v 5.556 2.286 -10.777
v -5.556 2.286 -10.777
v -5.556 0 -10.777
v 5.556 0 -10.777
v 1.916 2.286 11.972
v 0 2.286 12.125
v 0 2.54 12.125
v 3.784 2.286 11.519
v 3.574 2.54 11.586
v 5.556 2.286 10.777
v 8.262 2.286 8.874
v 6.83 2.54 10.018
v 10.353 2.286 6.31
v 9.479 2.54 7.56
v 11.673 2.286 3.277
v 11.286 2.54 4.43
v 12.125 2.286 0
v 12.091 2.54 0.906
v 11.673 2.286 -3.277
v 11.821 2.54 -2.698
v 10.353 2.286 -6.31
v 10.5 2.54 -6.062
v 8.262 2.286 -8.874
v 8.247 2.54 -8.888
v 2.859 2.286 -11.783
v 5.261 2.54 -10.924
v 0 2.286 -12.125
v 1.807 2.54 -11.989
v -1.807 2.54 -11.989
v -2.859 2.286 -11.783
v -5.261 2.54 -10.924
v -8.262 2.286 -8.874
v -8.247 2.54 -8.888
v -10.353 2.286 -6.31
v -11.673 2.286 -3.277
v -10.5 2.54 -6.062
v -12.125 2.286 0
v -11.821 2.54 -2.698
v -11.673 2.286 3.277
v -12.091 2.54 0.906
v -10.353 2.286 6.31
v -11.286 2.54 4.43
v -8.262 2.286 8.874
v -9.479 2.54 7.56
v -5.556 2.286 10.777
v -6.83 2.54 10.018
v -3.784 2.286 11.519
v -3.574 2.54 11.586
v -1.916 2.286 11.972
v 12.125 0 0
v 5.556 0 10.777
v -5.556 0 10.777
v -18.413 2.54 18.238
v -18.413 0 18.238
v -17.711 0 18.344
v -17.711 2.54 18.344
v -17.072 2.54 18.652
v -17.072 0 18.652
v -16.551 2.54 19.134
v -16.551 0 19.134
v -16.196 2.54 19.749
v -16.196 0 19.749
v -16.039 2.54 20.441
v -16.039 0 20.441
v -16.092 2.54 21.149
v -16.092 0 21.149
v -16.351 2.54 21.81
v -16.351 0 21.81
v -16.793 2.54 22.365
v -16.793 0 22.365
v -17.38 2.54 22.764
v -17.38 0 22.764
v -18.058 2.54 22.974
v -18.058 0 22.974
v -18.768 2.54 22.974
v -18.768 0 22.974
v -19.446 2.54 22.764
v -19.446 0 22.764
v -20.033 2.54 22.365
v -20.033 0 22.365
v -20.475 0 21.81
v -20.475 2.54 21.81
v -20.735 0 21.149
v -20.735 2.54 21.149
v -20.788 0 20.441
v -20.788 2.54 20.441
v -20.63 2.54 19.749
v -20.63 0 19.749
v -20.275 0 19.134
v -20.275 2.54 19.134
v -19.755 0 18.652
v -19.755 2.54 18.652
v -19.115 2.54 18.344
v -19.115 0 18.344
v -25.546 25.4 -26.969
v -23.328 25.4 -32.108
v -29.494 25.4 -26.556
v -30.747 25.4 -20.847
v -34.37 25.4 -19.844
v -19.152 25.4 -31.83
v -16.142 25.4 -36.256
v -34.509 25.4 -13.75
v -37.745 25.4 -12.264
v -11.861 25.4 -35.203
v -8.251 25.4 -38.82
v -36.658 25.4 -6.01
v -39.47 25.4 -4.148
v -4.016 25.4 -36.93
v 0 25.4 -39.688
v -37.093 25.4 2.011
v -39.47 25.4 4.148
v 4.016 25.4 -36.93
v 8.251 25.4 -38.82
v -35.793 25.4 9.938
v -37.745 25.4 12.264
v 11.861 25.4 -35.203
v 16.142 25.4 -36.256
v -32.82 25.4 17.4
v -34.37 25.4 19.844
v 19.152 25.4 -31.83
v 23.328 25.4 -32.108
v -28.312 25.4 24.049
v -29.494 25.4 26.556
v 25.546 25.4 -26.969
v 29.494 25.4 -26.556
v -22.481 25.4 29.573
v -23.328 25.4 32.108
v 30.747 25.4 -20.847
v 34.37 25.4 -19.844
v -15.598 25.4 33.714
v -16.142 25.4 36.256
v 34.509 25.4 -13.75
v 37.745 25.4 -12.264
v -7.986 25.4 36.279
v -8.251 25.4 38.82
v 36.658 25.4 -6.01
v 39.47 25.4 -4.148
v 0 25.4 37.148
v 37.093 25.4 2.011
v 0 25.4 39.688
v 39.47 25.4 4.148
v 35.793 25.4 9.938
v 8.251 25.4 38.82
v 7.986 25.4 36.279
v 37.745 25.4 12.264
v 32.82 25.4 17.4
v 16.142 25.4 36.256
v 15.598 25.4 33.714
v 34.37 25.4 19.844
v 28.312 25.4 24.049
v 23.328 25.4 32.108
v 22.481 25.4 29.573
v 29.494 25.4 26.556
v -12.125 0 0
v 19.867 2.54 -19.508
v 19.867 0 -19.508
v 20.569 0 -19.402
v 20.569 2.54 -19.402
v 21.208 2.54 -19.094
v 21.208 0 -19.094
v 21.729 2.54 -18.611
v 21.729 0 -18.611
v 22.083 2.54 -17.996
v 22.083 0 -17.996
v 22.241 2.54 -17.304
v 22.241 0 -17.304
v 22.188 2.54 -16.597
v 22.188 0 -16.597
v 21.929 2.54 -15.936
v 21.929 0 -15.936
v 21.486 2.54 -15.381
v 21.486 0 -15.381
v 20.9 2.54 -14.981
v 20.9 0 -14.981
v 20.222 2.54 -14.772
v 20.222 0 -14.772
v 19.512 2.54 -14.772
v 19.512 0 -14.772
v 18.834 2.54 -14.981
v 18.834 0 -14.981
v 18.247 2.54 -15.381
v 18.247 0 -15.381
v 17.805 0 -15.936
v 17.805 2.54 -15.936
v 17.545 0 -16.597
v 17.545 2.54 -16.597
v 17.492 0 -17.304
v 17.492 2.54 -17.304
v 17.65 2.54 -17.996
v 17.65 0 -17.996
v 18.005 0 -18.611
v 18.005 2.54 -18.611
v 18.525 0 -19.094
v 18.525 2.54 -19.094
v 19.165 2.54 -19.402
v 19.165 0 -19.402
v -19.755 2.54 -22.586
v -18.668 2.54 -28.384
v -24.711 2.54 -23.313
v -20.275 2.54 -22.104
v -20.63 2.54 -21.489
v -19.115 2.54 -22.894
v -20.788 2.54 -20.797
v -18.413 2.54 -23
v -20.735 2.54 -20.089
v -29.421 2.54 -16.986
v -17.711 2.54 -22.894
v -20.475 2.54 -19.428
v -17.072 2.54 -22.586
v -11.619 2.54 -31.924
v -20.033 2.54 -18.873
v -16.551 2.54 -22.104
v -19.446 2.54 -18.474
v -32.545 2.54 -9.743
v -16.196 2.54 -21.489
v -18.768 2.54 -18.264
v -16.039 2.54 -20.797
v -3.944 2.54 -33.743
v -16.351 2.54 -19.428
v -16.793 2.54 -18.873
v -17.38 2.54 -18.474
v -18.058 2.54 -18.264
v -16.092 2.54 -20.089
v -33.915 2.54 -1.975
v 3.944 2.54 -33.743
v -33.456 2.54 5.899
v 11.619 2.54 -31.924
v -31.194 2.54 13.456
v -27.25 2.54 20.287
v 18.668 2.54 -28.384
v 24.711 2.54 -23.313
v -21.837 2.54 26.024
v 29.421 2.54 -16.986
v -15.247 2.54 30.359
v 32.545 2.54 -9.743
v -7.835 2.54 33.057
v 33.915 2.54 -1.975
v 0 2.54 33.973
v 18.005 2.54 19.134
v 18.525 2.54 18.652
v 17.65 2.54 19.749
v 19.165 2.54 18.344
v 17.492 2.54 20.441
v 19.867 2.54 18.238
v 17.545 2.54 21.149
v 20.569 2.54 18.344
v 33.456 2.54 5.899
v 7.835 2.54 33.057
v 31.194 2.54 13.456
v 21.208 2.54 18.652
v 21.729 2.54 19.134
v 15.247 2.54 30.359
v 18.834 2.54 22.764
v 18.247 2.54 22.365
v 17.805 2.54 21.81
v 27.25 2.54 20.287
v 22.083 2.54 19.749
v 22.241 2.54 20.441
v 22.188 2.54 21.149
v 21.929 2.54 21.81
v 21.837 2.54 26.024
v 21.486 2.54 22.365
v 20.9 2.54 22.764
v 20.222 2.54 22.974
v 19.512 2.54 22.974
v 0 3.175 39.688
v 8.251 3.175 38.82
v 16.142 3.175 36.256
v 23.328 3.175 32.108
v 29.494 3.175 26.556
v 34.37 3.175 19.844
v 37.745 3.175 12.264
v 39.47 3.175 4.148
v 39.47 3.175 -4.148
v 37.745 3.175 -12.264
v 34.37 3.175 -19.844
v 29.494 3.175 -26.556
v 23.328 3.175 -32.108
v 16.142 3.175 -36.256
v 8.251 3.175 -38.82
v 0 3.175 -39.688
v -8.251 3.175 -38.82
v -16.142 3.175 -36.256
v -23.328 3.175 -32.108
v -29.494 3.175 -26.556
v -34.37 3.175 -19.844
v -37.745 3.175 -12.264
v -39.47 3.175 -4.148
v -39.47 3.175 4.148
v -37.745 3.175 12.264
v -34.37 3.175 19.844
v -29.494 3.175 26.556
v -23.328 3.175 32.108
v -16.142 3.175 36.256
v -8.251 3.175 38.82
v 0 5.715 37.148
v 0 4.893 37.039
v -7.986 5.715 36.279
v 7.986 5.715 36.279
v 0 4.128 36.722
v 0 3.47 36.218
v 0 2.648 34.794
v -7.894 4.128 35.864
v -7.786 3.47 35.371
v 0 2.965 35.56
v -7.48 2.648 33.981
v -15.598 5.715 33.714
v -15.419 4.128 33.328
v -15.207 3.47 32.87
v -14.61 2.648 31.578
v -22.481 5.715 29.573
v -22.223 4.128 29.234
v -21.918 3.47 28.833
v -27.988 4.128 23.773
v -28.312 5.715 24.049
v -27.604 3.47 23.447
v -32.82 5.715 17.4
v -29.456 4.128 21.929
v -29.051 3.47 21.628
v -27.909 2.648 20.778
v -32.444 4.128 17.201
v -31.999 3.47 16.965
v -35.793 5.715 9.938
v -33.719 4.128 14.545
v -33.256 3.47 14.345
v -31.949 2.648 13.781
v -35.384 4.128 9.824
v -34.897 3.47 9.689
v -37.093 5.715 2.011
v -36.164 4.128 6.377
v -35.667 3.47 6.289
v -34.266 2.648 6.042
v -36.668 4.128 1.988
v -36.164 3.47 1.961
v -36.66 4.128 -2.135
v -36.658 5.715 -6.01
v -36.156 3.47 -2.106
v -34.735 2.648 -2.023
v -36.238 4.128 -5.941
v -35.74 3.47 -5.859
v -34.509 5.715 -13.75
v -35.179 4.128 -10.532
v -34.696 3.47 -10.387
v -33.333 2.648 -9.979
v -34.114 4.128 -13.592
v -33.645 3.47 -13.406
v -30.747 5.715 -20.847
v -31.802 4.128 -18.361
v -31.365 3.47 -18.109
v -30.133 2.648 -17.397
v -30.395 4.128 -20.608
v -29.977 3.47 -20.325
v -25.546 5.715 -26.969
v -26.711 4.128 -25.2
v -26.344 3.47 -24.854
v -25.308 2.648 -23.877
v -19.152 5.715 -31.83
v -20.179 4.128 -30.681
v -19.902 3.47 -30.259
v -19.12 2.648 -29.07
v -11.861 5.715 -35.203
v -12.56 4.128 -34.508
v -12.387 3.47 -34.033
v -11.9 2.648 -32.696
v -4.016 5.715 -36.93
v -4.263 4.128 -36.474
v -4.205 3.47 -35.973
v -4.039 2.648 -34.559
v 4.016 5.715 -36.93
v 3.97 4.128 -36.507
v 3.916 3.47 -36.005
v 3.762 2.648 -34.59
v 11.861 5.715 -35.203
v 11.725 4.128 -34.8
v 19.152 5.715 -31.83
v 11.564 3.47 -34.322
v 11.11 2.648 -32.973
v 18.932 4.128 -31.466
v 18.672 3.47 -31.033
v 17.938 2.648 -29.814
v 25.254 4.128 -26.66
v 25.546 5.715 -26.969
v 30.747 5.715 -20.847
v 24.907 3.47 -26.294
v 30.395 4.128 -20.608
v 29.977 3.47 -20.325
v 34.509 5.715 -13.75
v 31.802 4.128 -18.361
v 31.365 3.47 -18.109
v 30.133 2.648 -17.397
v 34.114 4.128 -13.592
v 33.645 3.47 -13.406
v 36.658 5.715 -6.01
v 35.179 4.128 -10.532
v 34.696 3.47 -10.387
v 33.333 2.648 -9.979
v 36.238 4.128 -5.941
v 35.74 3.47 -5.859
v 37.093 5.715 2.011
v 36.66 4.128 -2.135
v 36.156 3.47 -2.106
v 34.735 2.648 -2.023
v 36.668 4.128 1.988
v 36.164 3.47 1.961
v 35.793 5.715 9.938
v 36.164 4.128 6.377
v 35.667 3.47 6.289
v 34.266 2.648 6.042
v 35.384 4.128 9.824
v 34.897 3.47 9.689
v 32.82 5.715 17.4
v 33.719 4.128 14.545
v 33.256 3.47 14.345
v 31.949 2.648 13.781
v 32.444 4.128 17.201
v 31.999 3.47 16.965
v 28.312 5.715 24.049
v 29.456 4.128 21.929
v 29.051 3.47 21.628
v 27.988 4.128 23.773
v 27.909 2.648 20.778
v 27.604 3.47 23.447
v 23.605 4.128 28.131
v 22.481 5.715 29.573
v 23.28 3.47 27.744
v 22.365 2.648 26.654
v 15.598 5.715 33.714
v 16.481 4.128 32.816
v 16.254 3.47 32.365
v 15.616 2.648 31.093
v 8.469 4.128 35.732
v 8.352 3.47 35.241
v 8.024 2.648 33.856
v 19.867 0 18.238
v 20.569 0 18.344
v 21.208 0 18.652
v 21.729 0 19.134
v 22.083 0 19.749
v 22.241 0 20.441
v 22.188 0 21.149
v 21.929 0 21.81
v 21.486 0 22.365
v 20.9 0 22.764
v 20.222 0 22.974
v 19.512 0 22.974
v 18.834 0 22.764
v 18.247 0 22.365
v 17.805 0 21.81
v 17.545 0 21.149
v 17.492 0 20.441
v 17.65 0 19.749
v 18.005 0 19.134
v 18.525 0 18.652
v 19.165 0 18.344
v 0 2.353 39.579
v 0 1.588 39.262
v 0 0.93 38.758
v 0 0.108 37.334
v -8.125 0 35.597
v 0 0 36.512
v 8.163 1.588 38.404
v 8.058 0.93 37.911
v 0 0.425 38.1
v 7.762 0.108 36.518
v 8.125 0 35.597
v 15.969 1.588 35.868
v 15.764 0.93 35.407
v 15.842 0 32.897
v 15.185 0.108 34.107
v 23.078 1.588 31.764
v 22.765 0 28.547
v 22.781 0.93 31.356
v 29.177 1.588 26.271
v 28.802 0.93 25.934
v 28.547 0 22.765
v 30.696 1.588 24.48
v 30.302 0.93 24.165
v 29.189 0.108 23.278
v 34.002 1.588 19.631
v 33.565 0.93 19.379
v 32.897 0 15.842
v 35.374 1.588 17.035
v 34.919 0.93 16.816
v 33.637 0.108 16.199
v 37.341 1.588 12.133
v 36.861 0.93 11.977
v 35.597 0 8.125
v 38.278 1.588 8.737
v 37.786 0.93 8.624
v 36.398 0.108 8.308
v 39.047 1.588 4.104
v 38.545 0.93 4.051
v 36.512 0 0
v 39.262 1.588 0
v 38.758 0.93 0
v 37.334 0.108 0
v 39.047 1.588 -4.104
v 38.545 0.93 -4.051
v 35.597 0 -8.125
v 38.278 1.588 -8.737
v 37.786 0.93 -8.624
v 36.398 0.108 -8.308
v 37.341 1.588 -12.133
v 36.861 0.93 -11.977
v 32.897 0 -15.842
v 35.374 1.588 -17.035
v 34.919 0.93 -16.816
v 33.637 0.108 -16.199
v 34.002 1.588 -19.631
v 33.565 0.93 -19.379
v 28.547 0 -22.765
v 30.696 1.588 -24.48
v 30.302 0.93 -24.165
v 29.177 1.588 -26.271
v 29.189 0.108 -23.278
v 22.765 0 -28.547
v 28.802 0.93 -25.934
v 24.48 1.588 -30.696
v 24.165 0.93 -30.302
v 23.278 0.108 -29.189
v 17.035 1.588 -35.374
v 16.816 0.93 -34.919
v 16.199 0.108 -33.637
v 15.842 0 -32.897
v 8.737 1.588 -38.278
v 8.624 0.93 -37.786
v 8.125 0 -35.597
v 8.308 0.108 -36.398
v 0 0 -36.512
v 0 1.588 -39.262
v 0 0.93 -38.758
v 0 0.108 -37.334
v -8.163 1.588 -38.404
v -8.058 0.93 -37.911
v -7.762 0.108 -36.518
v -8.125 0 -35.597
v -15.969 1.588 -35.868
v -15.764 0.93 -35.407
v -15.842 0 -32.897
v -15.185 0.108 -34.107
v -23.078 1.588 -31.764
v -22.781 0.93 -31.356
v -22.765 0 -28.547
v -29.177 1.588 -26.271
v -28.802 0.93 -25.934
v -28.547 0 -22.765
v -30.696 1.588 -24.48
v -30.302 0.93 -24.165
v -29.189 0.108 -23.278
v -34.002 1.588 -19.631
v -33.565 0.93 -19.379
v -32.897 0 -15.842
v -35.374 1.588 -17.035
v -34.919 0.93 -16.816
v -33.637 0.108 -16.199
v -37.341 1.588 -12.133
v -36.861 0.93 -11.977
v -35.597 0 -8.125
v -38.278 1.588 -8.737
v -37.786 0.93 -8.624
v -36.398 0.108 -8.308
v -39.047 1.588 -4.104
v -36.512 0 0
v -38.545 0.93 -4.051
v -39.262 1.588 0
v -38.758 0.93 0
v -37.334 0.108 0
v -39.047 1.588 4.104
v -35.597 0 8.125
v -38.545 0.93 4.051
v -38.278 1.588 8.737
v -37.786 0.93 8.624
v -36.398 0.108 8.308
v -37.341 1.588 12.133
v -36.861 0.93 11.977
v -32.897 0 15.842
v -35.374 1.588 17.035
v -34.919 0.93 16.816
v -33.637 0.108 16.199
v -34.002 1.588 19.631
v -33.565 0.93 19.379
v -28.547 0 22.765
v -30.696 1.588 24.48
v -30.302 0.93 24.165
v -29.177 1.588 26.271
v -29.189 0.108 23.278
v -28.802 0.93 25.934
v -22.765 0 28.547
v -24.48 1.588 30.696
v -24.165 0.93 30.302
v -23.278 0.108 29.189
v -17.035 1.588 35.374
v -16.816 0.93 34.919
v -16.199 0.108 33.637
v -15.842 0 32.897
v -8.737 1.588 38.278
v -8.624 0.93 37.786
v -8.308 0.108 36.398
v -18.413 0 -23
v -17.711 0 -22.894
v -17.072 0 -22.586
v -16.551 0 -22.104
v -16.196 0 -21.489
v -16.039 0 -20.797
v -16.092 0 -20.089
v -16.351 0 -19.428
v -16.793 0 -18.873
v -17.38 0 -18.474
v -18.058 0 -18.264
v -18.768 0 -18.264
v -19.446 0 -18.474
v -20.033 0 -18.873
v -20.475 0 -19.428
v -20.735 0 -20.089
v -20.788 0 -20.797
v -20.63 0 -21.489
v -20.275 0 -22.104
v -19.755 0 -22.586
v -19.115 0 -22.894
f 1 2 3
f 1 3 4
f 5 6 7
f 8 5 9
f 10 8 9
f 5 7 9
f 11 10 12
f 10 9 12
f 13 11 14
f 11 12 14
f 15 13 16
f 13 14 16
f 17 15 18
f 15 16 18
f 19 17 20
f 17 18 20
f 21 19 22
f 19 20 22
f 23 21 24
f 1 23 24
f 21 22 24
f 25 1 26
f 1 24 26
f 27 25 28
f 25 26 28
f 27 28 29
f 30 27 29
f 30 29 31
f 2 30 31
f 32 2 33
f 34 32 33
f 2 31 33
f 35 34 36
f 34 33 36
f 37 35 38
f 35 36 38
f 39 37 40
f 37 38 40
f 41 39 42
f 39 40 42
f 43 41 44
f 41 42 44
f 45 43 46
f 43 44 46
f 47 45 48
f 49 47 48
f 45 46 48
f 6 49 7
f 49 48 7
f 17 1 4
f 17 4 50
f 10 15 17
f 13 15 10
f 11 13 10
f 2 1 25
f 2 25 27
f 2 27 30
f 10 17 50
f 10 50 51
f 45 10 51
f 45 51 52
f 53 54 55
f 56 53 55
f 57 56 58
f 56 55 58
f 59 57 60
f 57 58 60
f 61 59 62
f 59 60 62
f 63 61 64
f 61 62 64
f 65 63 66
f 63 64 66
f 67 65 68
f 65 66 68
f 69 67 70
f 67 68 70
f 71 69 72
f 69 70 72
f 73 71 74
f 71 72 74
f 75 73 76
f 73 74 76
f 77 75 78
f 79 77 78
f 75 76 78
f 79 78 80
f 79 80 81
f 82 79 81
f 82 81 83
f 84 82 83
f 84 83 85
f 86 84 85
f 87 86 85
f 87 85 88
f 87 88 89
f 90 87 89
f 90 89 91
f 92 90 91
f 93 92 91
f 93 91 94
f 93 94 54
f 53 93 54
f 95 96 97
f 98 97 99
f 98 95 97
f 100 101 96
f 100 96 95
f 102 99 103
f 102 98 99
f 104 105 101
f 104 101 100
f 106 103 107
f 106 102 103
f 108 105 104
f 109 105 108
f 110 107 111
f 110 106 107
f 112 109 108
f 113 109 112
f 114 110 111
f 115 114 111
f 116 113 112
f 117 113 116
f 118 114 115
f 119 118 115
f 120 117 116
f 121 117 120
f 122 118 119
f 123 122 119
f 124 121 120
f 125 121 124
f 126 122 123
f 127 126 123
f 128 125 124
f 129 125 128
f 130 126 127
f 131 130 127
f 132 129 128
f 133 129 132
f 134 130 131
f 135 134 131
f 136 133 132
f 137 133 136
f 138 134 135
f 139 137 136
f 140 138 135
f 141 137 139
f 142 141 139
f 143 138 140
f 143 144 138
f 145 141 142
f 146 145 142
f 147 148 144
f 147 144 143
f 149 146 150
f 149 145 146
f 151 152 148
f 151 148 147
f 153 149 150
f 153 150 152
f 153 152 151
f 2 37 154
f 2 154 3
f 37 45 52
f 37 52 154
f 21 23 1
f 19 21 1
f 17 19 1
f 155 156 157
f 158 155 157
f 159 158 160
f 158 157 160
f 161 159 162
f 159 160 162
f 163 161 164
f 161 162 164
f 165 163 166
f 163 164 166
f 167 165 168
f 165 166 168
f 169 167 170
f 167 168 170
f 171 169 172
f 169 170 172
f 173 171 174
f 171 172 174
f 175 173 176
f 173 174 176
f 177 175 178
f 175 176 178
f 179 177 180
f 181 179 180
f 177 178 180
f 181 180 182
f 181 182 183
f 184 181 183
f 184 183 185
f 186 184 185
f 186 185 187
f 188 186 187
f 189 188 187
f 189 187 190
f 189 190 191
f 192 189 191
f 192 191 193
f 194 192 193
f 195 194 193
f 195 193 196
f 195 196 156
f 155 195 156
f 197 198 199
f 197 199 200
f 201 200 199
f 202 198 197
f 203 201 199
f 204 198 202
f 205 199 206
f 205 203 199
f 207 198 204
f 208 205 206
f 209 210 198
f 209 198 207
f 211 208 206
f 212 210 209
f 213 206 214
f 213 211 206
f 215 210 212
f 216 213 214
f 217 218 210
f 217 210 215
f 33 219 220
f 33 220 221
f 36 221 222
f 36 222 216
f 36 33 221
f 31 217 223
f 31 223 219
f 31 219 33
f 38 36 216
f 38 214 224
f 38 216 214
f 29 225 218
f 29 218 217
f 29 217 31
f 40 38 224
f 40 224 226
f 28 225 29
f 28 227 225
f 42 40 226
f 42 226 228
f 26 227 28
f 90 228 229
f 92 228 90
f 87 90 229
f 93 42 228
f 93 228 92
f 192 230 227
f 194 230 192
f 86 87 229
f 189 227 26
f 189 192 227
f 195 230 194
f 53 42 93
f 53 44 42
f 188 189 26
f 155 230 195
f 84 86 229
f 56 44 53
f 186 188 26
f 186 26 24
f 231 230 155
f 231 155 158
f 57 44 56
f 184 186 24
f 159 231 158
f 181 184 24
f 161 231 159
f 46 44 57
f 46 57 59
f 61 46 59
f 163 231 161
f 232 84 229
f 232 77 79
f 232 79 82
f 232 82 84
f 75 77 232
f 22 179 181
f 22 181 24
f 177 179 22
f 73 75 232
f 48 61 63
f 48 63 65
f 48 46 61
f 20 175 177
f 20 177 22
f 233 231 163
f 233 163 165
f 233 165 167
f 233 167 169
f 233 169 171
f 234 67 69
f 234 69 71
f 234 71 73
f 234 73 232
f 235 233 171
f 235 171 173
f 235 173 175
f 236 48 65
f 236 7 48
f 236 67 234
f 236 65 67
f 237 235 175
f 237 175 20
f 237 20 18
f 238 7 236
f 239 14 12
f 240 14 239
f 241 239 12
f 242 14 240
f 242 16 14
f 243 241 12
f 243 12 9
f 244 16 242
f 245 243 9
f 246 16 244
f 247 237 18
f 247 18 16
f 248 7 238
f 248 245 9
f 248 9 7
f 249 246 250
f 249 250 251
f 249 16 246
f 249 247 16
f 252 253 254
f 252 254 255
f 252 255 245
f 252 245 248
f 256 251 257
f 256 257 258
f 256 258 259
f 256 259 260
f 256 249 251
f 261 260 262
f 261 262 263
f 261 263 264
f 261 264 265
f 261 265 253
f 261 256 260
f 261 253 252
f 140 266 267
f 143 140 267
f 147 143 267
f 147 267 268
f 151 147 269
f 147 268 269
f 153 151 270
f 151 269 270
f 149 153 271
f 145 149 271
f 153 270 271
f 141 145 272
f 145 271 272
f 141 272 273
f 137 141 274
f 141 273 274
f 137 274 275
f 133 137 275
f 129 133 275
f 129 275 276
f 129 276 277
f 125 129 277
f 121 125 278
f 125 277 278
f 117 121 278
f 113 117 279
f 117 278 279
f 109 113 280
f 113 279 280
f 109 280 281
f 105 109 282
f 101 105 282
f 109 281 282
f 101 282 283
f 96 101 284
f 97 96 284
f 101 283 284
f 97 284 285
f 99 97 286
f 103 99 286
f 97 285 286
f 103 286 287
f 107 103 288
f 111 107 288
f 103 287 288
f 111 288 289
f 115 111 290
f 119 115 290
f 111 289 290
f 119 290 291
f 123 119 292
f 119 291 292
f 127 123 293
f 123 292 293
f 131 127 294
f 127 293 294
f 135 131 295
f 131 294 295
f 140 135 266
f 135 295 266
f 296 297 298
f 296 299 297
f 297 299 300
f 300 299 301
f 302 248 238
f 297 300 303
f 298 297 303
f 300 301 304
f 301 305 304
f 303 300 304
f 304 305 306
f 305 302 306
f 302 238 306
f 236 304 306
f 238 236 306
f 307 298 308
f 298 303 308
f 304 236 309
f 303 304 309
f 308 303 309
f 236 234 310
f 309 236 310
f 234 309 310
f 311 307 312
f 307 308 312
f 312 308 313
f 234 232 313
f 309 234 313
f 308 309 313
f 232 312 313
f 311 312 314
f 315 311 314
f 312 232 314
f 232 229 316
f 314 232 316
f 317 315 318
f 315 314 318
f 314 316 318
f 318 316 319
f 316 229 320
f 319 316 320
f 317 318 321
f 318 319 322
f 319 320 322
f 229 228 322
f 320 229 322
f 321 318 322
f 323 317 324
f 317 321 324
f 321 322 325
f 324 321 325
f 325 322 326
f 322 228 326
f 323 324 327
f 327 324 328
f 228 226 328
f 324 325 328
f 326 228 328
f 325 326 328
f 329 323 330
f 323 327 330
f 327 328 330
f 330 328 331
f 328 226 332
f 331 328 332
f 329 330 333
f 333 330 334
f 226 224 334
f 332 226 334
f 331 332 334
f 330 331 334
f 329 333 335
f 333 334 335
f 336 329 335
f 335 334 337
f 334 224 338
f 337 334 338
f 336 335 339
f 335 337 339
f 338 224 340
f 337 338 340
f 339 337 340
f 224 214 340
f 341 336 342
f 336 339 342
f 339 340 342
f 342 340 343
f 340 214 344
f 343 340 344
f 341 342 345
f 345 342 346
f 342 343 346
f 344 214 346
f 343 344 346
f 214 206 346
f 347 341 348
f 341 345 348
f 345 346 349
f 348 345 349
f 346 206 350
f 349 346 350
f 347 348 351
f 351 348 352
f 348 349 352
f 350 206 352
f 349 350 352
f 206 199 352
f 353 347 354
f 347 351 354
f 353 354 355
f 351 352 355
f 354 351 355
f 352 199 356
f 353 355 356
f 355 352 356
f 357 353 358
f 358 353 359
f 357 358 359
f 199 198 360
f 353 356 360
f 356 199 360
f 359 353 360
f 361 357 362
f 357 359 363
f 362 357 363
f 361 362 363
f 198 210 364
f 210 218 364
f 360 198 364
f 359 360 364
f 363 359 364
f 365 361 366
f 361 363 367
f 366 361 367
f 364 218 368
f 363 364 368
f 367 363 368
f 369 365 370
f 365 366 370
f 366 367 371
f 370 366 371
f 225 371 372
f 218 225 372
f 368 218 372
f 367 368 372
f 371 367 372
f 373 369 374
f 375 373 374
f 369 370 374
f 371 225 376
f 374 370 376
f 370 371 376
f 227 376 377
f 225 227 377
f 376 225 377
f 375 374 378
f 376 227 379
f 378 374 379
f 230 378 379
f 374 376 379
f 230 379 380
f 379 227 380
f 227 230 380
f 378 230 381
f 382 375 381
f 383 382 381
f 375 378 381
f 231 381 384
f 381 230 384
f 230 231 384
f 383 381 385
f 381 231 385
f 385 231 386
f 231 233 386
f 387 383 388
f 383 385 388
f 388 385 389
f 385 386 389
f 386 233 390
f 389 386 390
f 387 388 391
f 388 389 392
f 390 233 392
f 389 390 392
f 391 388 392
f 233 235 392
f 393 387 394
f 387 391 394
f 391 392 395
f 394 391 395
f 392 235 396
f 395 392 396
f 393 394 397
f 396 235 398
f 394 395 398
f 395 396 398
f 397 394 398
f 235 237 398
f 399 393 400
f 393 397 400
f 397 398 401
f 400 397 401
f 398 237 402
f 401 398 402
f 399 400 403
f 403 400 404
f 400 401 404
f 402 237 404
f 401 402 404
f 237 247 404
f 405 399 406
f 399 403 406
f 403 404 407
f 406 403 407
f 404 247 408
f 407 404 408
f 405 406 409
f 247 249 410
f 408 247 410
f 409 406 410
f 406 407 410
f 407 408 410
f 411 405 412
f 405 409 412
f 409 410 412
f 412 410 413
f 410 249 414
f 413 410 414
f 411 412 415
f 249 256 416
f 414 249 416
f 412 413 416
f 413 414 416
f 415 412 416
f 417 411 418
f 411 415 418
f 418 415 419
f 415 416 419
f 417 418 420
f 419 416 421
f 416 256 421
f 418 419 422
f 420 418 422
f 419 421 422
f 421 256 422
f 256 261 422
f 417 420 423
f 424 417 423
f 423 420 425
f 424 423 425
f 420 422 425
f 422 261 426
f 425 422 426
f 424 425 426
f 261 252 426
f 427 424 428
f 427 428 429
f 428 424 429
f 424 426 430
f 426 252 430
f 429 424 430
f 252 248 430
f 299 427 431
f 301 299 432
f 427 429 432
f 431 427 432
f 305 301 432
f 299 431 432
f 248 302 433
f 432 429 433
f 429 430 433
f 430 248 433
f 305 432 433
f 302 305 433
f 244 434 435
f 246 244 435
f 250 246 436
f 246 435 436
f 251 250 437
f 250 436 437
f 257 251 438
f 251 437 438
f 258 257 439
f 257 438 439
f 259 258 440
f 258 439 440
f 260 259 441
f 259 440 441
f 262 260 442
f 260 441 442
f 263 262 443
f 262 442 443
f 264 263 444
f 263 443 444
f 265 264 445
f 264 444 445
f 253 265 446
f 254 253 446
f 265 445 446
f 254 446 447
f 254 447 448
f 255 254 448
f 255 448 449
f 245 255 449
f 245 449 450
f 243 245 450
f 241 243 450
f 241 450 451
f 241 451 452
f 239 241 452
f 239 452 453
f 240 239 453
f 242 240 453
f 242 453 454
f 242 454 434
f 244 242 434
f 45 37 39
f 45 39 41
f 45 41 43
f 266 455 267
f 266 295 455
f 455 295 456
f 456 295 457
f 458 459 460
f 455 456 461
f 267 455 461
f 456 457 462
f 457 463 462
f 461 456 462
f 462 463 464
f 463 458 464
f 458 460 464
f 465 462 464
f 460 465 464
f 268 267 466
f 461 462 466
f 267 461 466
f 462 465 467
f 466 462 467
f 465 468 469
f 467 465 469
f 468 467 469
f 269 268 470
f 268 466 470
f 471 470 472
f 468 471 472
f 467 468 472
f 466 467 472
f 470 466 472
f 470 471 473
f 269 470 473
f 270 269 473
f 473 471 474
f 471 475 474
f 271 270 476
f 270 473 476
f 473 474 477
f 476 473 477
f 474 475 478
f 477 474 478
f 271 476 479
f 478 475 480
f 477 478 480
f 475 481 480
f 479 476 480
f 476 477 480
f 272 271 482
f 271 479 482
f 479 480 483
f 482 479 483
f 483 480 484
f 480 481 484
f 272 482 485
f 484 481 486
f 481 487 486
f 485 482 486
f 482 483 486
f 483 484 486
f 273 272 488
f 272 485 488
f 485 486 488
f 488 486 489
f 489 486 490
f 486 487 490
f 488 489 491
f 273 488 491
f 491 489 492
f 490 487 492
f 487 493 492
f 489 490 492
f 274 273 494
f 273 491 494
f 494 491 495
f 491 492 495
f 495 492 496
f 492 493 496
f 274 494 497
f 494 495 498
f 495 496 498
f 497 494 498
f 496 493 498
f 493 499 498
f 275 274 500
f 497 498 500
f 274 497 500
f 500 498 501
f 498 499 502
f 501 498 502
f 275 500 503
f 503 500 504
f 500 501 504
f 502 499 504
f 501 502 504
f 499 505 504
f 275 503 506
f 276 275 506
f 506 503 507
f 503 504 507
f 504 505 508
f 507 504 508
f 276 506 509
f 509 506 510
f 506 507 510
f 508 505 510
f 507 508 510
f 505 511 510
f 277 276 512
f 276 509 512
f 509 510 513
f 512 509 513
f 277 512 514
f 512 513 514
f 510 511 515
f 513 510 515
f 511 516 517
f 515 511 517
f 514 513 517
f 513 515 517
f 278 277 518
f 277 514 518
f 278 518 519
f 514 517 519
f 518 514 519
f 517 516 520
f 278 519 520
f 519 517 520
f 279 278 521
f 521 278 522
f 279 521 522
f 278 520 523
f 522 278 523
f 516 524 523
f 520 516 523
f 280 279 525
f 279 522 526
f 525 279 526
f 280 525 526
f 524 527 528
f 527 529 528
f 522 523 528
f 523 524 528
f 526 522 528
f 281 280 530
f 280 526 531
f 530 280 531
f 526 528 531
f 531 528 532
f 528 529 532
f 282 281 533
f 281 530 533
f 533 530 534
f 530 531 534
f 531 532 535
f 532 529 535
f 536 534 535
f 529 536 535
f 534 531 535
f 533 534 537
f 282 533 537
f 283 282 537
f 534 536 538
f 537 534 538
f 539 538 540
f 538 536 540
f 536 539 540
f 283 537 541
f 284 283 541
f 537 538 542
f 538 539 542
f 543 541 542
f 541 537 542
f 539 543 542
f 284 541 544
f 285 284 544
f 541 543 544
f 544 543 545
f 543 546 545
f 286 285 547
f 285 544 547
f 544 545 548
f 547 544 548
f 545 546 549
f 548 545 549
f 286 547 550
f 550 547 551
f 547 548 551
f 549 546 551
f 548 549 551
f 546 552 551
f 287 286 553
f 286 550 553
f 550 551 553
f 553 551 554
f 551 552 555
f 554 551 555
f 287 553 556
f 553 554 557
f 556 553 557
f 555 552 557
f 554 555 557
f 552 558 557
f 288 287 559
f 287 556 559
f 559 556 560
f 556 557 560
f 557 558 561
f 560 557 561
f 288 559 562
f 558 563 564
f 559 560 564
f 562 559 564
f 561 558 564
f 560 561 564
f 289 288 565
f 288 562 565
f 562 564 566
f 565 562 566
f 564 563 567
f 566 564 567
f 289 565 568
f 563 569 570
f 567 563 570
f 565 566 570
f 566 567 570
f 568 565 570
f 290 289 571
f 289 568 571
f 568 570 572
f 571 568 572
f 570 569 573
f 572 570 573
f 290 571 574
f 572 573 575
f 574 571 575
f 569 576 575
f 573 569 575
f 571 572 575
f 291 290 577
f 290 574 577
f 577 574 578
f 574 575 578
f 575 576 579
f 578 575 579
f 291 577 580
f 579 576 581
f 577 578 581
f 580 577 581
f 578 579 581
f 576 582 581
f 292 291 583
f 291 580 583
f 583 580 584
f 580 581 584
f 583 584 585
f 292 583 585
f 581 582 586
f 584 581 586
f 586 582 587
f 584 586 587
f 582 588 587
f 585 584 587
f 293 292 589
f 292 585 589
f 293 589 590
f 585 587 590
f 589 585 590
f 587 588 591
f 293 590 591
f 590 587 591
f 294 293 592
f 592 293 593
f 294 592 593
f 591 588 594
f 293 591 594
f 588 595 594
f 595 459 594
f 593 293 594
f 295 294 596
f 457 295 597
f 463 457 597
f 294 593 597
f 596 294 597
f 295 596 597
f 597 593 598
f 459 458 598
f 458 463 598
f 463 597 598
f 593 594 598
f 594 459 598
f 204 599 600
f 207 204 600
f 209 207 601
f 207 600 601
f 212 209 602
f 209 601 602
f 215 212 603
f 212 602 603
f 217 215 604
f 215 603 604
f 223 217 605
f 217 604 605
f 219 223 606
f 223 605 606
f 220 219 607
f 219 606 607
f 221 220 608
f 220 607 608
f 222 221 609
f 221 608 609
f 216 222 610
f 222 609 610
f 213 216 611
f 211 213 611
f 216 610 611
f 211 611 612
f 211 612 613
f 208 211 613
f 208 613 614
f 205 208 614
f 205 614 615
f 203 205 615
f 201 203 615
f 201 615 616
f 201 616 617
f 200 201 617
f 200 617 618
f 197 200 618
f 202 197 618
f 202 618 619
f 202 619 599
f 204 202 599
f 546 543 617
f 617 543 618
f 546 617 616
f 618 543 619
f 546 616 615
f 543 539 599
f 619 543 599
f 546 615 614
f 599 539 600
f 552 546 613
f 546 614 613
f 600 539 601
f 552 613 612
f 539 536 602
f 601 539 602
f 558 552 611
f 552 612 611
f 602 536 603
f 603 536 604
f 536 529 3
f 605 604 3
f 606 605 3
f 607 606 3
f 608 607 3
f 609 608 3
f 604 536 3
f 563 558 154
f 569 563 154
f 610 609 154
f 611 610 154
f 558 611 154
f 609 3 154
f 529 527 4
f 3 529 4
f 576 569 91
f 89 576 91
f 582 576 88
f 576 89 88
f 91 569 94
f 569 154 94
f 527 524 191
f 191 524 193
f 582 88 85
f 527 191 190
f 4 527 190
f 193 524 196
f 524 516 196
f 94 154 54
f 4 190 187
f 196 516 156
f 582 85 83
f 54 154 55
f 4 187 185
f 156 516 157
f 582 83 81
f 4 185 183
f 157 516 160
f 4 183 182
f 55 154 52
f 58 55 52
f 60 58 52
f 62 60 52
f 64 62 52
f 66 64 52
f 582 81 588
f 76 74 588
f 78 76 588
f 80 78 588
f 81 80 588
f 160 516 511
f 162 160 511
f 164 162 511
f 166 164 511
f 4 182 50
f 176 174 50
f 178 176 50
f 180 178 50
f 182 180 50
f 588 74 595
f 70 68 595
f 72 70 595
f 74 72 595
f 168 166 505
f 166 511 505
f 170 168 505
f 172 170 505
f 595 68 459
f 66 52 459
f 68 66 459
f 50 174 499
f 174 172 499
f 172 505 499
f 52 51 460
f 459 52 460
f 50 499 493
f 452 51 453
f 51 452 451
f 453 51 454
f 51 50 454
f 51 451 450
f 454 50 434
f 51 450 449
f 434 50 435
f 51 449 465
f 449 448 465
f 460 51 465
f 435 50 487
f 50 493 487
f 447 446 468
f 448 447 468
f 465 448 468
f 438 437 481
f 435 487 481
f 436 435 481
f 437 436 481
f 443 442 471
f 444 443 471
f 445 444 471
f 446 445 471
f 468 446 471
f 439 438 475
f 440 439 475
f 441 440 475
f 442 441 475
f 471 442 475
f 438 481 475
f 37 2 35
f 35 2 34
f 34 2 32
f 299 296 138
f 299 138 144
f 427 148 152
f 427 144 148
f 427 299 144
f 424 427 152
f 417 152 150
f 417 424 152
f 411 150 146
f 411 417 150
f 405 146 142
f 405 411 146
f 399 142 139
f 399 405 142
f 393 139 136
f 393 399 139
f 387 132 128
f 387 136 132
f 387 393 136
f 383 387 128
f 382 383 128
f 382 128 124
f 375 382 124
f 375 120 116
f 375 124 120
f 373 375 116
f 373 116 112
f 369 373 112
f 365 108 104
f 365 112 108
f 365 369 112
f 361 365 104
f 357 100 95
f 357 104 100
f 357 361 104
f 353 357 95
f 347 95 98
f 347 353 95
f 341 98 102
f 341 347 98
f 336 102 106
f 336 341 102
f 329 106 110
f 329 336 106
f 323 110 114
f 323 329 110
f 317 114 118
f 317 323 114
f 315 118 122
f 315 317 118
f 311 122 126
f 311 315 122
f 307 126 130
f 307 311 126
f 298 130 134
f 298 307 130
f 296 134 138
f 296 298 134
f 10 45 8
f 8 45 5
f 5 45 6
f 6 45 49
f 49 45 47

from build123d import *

# Parameters (mm, degrees)
SKETCH1_R           = 39.6875
BOSS_EXTRUDE1_DEPTH = 25.4
SHELL1_T            = -2.54
CUT_EXTRUDE1_DEPTH  = 62.60645512
SKETCH4_R           = 12.124567064
CUT_EXTRUDE2_DEPTH  = 0.254
FILLET1_R           = 3.175
SKETCH5_R           = 2.38125
CUT_EXTRUDE3_DEPTH  = 62.606455185
FILLET2_R           = 3.175


with BuildPart() as part:
    # Sketch1 → Boss-Extrude1 (new body)
    with BuildSketch(Plane(origin=(0, 0, 0), x_dir=(1, 0, 0), z_dir=(0, 1, 0))):
        with Locations(Location((0, 0, 0), (0, 0, 270))):
            Circle(SKETCH1_R)
    extrude(amount=BOSS_EXTRUDE1_DEPTH)

    # Shell1
    shell1_openings = [part.faces().sort_by_distance(p)[0] for p in [
        (0, 25.4, 0),
    ]]
    offset(amount=SHELL1_T, openings=shell1_openings, kind=Kind.INTERSECTION)

    # Sketch2 → Cut-Extrude1 (cut, through all)
    with BuildSketch(Plane(origin=(0, 25.4, 0), x_dir=(1, 0, 0), z_dir=(0, 1, 0))):
        Polygon((-5.55625, 10.776512071), (5.55625, 10.776512071), (12.124567064, 0), (5.55625, -10.776512071), (-5.55625, -10.776512071), (-12.124567064, 0), align=None)
    extrude(amount=-CUT_EXTRUDE1_DEPTH, mode=Mode.SUBTRACT)

    # Sketch4 → Cut-Extrude2 (cut)
    with BuildSketch(Plane(origin=(0, 2.54, 0), x_dir=(1, 0, 0), z_dir=(0, 1, 0))):
        with Locations(Location((0, 0, 0), (0, 0, 270))):
            Circle(SKETCH4_R)
    extrude(amount=-CUT_EXTRUDE2_DEPTH, mode=Mode.SUBTRACT)

    # Fillet1
    fillet1_edges = [part.edges().sort_by_distance(p)[0] for p in [
        (0, 0, -39.6875),
    ]]
    fillet(fillet1_edges, radius=FILLET1_R)

    # Sketch5 → Cut-Extrude3 (cut, through all)
    with BuildSketch(Plane.XZ):
        with Locations(Location((19.866785326, 20.619012071, 0), (0, 0, 270))):
            Circle(SKETCH5_R)
        with Locations(Location((-18.413118107, 20.619012071, 0), (0, 0, 270))):
            Circle(SKETCH5_R)
        with Locations(Location((-18.413118107, -20.619012071, 0), (0, 0, 270))):
            Circle(SKETCH5_R)
        with Locations(Location((19.866785326, -17.126512071, 0), (0, 0, 270))):
            Circle(SKETCH5_R)
    extrude(amount=-CUT_EXTRUDE3_DEPTH, mode=Mode.SUBTRACT)

    # Fillet2
    fillet2_edges = [part.edges().sort_by_distance(p)[0] for p in [
        (0, 2.54, -37.1475),
    ]]
    fillet(fillet2_edges, radius=FILLET2_R)


solid = part.part
